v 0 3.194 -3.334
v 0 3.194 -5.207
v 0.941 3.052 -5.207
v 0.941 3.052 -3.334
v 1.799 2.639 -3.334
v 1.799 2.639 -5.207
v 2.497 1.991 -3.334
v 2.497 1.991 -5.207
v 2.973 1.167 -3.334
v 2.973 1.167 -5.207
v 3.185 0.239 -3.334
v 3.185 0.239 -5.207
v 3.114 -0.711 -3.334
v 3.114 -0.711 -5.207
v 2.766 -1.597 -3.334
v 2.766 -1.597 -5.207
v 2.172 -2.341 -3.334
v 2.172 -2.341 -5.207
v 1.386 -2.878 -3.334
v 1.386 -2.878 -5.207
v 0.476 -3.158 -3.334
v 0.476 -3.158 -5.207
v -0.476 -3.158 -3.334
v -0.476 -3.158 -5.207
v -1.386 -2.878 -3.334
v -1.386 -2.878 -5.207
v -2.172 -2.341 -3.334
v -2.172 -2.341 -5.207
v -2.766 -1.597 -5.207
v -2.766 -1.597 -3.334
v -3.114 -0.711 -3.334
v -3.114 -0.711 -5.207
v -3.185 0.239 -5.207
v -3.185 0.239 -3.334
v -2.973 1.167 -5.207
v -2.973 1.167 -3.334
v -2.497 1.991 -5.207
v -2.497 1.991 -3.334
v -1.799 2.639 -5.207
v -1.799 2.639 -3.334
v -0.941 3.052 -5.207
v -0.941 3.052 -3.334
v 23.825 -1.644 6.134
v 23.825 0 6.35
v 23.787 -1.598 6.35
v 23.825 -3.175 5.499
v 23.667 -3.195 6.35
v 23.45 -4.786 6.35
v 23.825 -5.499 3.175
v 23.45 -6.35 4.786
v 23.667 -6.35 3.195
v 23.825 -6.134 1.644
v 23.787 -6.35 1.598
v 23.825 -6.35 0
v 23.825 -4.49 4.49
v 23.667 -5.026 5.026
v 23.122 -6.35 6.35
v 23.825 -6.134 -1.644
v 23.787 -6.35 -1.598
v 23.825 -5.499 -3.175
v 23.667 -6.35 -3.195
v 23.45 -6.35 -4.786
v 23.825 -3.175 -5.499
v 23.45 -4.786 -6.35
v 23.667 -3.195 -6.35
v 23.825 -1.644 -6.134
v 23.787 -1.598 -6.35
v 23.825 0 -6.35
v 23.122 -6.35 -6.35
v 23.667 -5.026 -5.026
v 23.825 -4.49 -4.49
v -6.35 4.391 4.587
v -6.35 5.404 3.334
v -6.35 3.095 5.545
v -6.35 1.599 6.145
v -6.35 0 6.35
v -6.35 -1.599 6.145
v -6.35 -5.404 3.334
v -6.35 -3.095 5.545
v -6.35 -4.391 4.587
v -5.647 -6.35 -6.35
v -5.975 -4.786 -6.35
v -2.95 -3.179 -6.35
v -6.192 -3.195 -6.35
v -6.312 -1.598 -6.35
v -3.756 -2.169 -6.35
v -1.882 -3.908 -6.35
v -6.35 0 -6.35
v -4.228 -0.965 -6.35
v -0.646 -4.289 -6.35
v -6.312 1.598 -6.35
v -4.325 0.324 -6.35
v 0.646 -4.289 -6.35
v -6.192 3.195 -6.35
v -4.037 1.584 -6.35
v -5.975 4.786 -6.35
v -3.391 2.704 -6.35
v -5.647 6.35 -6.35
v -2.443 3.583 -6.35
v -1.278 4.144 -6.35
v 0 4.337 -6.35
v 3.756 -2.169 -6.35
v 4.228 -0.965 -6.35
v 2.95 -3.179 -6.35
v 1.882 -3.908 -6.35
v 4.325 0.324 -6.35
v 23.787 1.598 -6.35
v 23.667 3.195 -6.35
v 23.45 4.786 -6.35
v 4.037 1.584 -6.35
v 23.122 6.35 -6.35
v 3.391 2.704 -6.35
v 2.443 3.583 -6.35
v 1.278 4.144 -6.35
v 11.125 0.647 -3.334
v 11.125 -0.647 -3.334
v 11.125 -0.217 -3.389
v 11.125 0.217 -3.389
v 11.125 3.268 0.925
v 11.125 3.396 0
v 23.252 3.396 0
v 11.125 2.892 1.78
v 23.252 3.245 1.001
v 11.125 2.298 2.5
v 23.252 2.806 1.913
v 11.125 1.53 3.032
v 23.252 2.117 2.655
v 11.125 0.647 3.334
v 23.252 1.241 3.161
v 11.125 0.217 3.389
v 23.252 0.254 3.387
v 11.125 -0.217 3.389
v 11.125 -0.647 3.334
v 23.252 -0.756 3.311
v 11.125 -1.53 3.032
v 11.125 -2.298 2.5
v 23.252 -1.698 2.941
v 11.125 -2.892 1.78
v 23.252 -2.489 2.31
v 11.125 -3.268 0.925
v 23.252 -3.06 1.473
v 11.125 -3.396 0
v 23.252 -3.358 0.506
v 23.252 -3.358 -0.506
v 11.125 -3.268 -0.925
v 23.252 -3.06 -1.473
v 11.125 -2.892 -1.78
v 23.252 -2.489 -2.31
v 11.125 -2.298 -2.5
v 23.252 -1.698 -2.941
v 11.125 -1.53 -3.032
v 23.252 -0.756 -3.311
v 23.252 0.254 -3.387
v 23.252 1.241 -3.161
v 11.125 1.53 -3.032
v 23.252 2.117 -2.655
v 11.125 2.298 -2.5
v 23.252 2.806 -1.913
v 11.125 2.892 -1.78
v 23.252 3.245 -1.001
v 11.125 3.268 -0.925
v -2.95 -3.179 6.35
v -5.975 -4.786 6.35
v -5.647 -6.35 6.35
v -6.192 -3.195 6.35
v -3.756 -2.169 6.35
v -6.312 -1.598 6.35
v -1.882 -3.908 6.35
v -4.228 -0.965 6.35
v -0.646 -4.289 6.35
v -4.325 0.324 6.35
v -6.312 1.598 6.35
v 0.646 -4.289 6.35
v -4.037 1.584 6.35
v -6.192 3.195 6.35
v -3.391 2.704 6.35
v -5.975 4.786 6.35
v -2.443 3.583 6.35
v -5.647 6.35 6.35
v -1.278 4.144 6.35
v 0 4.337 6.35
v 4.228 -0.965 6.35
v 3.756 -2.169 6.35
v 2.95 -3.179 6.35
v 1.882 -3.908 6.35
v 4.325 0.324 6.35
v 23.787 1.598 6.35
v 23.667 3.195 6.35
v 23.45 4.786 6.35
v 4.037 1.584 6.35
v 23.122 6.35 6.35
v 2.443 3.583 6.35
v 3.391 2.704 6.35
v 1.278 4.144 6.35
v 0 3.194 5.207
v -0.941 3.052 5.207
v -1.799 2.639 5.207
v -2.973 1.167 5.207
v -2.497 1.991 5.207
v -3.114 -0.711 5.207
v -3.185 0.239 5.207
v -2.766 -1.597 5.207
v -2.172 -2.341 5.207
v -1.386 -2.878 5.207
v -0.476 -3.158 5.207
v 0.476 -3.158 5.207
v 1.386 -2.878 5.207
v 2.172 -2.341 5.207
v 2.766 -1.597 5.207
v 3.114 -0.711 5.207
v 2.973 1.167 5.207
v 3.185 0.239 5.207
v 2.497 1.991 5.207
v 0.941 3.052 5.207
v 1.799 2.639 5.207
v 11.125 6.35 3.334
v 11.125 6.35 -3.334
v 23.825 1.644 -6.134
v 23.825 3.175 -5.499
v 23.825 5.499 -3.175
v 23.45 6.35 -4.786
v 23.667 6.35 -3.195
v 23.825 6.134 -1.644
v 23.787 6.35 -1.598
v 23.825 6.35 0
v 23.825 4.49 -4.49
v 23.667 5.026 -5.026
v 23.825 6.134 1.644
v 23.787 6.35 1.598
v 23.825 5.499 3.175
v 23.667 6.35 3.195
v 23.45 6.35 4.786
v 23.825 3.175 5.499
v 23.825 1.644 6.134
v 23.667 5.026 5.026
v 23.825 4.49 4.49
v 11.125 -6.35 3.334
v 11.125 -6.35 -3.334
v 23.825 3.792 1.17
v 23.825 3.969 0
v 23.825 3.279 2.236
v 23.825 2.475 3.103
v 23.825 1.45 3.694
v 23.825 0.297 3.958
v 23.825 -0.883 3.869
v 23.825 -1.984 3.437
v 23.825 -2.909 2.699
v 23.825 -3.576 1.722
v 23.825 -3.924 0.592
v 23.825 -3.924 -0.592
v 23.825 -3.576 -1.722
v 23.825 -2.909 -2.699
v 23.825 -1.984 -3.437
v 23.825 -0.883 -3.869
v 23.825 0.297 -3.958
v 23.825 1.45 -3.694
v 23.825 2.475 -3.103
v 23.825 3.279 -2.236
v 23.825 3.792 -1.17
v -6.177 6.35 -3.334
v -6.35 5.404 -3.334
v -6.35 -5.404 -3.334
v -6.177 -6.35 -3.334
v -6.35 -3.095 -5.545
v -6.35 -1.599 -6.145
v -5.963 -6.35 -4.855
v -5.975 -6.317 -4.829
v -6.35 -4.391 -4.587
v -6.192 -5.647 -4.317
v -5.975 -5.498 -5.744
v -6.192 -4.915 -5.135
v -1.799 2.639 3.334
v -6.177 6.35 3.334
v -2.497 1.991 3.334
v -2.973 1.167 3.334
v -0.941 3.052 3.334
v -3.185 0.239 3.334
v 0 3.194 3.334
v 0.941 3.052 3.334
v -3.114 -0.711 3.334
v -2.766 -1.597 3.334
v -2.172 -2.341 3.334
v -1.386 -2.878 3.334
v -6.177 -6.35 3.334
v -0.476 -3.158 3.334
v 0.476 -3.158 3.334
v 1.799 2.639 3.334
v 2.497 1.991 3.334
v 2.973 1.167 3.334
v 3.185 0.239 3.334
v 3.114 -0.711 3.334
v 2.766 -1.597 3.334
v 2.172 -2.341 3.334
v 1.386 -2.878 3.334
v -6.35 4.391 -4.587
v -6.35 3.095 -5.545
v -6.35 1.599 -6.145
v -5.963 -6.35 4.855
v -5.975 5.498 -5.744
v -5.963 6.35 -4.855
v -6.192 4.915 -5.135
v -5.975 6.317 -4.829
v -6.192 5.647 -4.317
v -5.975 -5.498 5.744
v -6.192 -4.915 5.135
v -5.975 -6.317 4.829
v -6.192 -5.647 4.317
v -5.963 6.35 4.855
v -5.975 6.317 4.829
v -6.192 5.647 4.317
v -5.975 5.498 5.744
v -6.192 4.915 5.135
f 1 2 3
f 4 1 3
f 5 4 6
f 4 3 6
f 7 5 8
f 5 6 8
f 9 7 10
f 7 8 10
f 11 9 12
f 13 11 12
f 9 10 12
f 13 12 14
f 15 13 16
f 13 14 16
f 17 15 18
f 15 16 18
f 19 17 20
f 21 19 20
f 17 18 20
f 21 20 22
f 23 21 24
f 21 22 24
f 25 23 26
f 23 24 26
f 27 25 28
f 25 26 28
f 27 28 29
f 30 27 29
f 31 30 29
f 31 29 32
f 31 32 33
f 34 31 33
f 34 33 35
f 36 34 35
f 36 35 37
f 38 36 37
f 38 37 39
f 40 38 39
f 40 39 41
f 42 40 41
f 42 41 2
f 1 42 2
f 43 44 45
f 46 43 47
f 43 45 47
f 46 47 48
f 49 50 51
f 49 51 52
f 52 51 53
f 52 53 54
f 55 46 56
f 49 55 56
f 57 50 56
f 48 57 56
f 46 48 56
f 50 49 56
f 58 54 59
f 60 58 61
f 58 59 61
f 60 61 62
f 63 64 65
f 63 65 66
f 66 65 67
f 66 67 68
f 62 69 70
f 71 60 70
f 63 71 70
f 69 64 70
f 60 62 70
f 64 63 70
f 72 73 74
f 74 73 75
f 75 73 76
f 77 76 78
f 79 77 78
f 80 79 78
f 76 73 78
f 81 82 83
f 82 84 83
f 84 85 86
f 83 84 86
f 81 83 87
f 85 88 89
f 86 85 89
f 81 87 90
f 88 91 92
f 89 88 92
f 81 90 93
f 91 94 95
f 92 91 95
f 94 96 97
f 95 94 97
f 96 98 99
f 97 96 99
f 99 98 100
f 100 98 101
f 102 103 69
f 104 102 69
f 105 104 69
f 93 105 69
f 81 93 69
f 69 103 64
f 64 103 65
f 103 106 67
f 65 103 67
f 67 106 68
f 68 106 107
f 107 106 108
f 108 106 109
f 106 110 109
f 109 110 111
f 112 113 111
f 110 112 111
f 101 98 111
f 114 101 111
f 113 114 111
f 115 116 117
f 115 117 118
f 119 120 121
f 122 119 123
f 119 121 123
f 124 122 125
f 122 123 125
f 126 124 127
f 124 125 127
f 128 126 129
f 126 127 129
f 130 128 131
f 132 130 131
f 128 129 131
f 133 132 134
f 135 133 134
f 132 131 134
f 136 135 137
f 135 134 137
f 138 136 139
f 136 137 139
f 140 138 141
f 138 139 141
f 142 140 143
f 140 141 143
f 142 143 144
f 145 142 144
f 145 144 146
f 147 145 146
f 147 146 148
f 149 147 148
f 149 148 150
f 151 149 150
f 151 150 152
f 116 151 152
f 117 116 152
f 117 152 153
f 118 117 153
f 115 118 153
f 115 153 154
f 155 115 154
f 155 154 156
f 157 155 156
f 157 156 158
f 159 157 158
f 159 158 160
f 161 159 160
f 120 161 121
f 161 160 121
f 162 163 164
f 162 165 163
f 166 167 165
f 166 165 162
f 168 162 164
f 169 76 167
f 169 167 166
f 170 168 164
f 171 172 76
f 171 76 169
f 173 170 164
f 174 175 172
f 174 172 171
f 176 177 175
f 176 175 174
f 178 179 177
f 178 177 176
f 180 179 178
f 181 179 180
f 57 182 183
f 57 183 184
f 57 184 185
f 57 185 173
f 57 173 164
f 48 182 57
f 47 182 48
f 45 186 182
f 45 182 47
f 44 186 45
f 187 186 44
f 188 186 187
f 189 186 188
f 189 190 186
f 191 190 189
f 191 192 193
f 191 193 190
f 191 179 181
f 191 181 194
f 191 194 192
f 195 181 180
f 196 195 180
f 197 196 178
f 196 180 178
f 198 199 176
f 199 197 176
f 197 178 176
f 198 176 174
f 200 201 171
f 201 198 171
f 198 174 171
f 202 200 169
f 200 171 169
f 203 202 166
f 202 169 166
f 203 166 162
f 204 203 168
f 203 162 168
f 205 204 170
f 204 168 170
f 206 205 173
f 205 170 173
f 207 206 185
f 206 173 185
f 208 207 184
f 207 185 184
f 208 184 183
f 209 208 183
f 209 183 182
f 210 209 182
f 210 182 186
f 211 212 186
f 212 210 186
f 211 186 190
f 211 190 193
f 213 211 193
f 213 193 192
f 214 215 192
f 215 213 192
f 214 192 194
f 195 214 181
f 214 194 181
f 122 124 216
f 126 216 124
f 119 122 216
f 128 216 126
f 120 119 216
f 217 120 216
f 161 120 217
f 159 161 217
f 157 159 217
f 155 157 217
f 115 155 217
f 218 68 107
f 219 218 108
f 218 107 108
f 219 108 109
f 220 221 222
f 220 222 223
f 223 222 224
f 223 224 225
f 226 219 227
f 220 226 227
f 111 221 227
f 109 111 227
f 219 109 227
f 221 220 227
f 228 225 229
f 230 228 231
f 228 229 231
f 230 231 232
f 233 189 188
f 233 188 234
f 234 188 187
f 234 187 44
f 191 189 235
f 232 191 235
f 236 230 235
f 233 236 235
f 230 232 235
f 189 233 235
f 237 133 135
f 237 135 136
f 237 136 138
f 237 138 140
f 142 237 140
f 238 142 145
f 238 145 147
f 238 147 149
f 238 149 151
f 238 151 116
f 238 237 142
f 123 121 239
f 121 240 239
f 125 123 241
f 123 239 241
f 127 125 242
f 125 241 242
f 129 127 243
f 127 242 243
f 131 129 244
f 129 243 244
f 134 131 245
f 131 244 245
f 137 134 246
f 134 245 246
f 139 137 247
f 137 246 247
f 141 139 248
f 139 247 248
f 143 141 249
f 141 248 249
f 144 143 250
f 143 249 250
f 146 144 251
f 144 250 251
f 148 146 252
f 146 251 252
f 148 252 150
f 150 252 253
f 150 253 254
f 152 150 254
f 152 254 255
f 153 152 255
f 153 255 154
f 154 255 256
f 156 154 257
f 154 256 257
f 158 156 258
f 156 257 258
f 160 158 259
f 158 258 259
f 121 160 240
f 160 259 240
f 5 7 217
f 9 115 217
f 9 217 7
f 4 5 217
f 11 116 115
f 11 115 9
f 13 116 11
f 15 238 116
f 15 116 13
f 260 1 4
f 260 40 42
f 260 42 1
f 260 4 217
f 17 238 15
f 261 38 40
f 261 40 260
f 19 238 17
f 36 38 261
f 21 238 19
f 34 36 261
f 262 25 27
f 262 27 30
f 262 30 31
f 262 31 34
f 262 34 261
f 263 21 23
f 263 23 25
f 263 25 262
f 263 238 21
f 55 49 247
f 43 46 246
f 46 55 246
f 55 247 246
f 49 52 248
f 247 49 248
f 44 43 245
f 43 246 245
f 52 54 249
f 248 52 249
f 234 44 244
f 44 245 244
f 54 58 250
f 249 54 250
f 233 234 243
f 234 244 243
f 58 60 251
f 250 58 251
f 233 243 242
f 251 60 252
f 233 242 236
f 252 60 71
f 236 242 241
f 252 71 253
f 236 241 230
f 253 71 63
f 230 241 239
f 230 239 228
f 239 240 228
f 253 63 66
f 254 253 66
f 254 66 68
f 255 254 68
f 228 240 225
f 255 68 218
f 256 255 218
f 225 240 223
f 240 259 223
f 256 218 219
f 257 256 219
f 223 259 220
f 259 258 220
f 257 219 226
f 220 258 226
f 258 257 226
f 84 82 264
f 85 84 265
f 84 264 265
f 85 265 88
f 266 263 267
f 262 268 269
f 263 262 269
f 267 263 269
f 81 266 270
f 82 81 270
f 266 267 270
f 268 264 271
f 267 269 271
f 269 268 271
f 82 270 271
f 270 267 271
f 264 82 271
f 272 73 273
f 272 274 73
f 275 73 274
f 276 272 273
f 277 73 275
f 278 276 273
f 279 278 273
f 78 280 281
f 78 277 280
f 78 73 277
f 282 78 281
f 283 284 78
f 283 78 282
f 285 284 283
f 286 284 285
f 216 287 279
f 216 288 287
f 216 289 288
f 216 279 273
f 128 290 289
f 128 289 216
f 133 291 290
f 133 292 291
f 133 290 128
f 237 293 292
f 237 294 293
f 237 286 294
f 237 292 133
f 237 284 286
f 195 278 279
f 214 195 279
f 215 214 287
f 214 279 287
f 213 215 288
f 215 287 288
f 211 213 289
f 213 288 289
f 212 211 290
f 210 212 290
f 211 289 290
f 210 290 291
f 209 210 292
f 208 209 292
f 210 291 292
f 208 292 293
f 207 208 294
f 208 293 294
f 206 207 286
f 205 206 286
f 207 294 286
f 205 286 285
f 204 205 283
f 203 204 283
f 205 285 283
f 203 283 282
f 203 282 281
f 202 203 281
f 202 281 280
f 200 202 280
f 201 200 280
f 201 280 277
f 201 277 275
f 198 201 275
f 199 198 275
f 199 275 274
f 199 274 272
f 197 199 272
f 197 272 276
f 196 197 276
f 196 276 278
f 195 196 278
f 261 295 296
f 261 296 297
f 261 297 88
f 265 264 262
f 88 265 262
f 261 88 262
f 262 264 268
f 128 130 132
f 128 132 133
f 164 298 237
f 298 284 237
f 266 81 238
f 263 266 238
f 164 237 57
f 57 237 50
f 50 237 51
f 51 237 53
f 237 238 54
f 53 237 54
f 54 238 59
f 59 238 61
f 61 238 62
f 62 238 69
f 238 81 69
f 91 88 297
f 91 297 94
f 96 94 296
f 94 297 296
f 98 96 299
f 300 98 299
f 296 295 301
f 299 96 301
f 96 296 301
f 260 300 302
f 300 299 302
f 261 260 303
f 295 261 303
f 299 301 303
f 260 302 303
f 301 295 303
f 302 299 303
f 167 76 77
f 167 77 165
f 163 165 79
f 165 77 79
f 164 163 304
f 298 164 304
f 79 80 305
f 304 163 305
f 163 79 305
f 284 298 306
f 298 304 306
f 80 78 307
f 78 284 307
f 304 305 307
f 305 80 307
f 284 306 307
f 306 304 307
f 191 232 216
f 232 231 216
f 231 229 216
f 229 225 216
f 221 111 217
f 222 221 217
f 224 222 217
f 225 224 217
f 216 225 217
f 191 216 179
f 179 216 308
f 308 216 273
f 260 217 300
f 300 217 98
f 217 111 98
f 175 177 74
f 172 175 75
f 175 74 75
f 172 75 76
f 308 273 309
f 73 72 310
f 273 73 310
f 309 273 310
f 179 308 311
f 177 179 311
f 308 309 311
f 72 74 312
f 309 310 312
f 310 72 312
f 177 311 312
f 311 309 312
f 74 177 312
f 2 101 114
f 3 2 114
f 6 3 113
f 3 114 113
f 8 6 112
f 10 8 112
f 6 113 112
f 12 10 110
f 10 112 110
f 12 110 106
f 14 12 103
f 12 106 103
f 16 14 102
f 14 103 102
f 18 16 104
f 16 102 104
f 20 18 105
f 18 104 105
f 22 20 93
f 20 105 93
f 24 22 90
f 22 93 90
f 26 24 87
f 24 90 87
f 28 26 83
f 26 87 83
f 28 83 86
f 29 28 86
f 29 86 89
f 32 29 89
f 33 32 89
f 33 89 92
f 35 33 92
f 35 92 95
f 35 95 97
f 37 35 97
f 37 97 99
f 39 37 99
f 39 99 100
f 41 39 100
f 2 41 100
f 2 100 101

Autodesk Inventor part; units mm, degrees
sketch "Sketch_1" plane through (0, 0, 0) normal (0, 0, 1) x (1, 0, 0)
  line L0 (-6.35, 6.35) -> (-6.35, -6.35)
  line L1 (-6.35, -6.35) -> (23.8252, -6.35)
  line L2 (23.8252, -6.35) -> (23.8252, 6.35)
  line L3 (23.8252, 6.35) -> (-6.35, 6.35)
extrude "Extrusion1" add sketch "Sketch_1" along normal mid plane 12.7
sketch "Sketch_2" plane through (0, 0, 0) normal (0, 1, 0) x (-1, 0, 0)
  line L0 (6.35, -3.3338) -> (6.35, 3.3338)
  line L1 (6.35, 3.3338) -> (-11.1252, 3.3338)
  line L2 (-11.1252, 3.3338) -> (-11.1252, -3.3338)
  line L3 (-11.1252, -3.3338) -> (6.35, -3.3338)
extrude "Extrusion2" cut sketch "Sketch_2" along normal mid plane 12.7
sketch "Sketch_3" plane through (0, 0, 0) normal (0, 0, 1) x (1, 0, 0)
  line L0 (23.8252, 0) -> (12.6492, 0)
  line L1 (12.6492, 0) -> (12.6492, 3.396)
  line L2 (12.6492, 3.396) -> (23.2524, 3.396)
  line L3 (23.2524, 3.396) -> (23.8252, 3.9688)
  line L4 (23.8252, 3.9688) -> (23.8252, 0)
  line L5 (23.8252, 0) -> (12.6492, 0)
revolve "Revolution1" cut sketch "Sketch_3" angle 360 about axis through (23.8252, 0, 0) along (1, 0, 0)
thread "Thread1" size "5/16-20 UN" class "3B" standard "ANSI Unified Screw Threads" full length
sketch "Sketch_4" plane through (0, 0, 0) normal (0, 0, 1) x (1, 0, 0)
  line L0 (12.6492, 0) -> (11.1252, 0)
  line L1 (11.1252, 0) -> (11.1252, 3.396)
  line L2 (11.1252, 3.396) -> (12.6492, 3.396)
  line L3 (12.6492, 3.396) -> (12.6492, 0)
  line L4 (12.6492, 0) -> (11.1252, 0)
revolve "Revolution2" cut sketch "Sketch_4" angle 360 about axis through (12.6492, 0, 0) along (1, 0, 0)
sketch "Sketch_5" plane through (0, 0, 0) normal (1, 0, 0) x (0, 1, 0)
  line L0 (0, -6.35) -> (0, 6.35)
  line L1 (0, 6.35) -> (4.337, 6.35)
  line L2 (4.337, 6.35) -> (3.194, 5.207)
  line L3 (3.194, 5.207) -> (3.194, -5.207)
  line L4 (3.194, -5.207) -> (4.337, -6.35)
  line L5 (4.337, -6.35) -> (0, -6.35)
  line L6 (0, -6.35) -> (0, 6.35)
revolve "Revolution3" cut sketch "Sketch_5" angle 360 about axis through (0, 0, -6.35) along (0, 0, -1)
sketch "Sketch_9" plane through (0, 0, 0) normal (0, 0, 1) x (1, 0, 0)
  line L0 (30.1752, 0) -> (23.8252, 0)
  line L1 (23.8252, 0) -> (23.8252, 6.35)
  arc A0 (23.8252, 6.35) -> (21.2852, 12.7) centre (6.6802, 3.175) ccw
  line L2 (21.2852, 12.7) -> (30.1752, 12.7)
  line L3 (30.1752, 12.7) -> (30.1752, 0)
  line L4 (30.1752, 0) -> (23.8252, 0)
revolve "Revolution4" cut sketch "Sketch_9" angle 360 about axis through (30.1752, 0, 0) along (1, 0, 0)
sketch "Sketch_10" plane through (0, 0, 0) normal (0, 0, 1) x (1, 0, 0)
  line L0 (-6.35, 0) -> (-12.7, 0)
  line L1 (-12.7, 0) -> (-12.7, 12.7)
  line L2 (-12.7, 12.7) -> (-3.81, 12.7)
  arc A0 (-3.81, 12.7) -> (-6.35, 6.35) centre (10.795, 3.175) ccw
  line L3 (-6.35, 6.35) -> (-6.35, 0)
  line L4 (-6.35, 0) -> (-12.7, 0)
revolve "Revolution5" cut sketch "Sketch_10" angle 360 about axis through (-6.35, 0, 0) along (1, 0, 0)
ref_plane "th1_XY" through (23.8252, 3.9688, 0) normal (0, 0, 1) x (1, 0, 0)
ref_plane "th1_YZ" through (23.8252, 3.9688, 0) normal (1, 0, 0) x (0, 1, 0)
ref_plane "th1_ZX" through (23.8252, 3.9688, 0) normal (0, 1, 0) x (0, 0, 1)
ref_plane "th2_XY" through (23.8252, -3.9688, 0) normal (0, 0, 1) x (1, 0, 0)
ref_plane "th2_YZ" through (23.8252, -3.9688, 0) normal (1, 0, 0) x (0, 1, 0)
ref_plane "th2_ZX" through (23.8252, -3.9688, 0) normal (0, 1, 0) x (0, 0, 1)
ref_plane "rod_clevis_body_XY" through (0, 0, 0) normal (0, 0, 1) x (1, 0, 0)
ref_plane "rod_clevis_body_YZ" through (0, 0, 0) normal (1, 0, 0) x (0, 1, 0)
ref_plane "rod_clevis_body_ZX" through (0, 0, 0) normal (0, 1, 0) x (0, 0, 1)
ref_plane "piston_rod_clevis_XY" through (23.8252, 0, 0) normal (1, 0, 0) x (0, 0, -1)
ref_plane "piston_rod_clevis_YZ" through (23.8252, 0, 0) normal (0, 0, -1) x (0, 1, 0)
ref_plane "piston_rod_clevis_ZX" through (23.8252, 0, 0) normal (0, 1, 0) x (1, 0, 0)
ref_plane "dummy_XY" through (0, 0, 0) normal (0, 0, 1) x (1, 0, 0)
ref_plane "dummy_YZ" through (0, 0, 0) normal (1, 0, 0) x (0, 1, 0)
ref_plane "dummy_ZX" through (0, 0, 0) normal (0, 1, 0) x (0, 0, 1)
ref_plane "l11_XY" through (23.8252, 6.35, 0) normal (0, 0, 1) x (1, 0, 0)
ref_plane "l11_YZ" through (23.8252, 6.35, 0) normal (1, 0, 0) x (0, 1, 0)
ref_plane "l11_ZX" through (23.8252, 6.35, 0) normal (0, 1, 0) x (0, 0, 1)
ref_plane "l12_XY" through (0, 6.35, 0) normal (0, 0, 1) x (1, 0, 0)
ref_plane "l12_YZ" through (0, 6.35, 0) normal (1, 0, 0) x (0, 1, 0)
ref_plane "l12_ZX" through (0, 6.35, 0) normal (0, 1, 0) x (0, 0, 1)
ref_plane "l1_XY" through (23.8252, 6.35, 0) normal (0, 0, 1) x (1, 0, 0)
ref_plane "l1_YZ" through (23.8252, 6.35, 0) normal (1, 0, 0) x (0, 1, 0)
ref_plane "l1_ZX" through (23.8252, 6.35, 0) normal (0, 1, 0) x (0, 0, 1)
ref_plane "h1_XY" through (-6.35, 6.35, 0) normal (0, 0, 1) x (1, 0, 0)
ref_plane "h1_YZ" through (-6.35, 6.35, 0) normal (1, 0, 0) x (0, 1, 0)
ref_plane "h1_ZX" through (-6.35, 6.35, 0) normal (0, 1, 0) x (0, 0, 1)
ref_plane "l2_XY" through (-6.35, 6.35, 0) normal (0, 0, 1) x (1, 0, 0)
ref_plane "l2_YZ" through (-6.35, 6.35, 0) normal (1, 0, 0) x (0, 1, 0)
ref_plane "l2_ZX" through (-6.35, 6.35, 0) normal (0, 1, 0) x (0, 0, 1)
ref_plane "h2_XY" through (-6.35, -6.35, 0) normal (0, 0, 1) x (1, 0, 0)
ref_plane "h2_YZ" through (-6.35, -6.35, 0) normal (1, 0, 0) x (0, 1, 0)
ref_plane "h2_ZX" through (-6.35, -6.35, 0) normal (0, 1, 0) x (0, 0, 1)
ref_plane "w11_XY" through (-6.35, 0, -3.3338) normal (0, 1, 0) x (1, 0, 0)
ref_plane "w11_YZ" through (-6.35, 0, -3.3338) normal (1, 0, 0) x (0, 0, -1)
ref_plane "w11_ZX" through (-6.35, 0, -3.3338) normal (0, 0, -1) x (0, 1, 0)
ref_plane "w12_XY" through (-6.35, 0, 3.3338) normal (0, 1, 0) x (1, 0, 0)
ref_plane "w12_YZ" through (-6.35, 0, 3.3338) normal (1, 0, 0) x (0, 0, -1)
ref_plane "w12_ZX" through (-6.35, 0, 3.3338) normal (0, 0, -1) x (0, 1, 0)
ref_plane "l21_XY" through (23.8252, 0, 0) normal (0, 1, 0) x (1, 0, 0)
ref_plane "l21_YZ" through (23.8252, 0, 0) normal (1, 0, 0) x (0, 0, -1)
ref_plane "l21_ZX" through (23.8252, 0, 0) normal (0, 0, -1) x (0, 1, 0)
ref_plane "l22_XY" through (11.1252, 0, 0) normal (0, 1, 0) x (1, 0, 0)
ref_plane "l22_YZ" through (11.1252, 0, 0) normal (1, 0, 0) x (0, 0, -1)
ref_plane "l22_ZX" through (11.1252, 0, 0) normal (0, 0, -1) x (0, 1, 0)
ref_plane "w1_XY" through (23.8252, 0, -6.35) normal (0, 1, 0) x (1, 0, 0)
ref_plane "w1_YZ" through (23.8252, 0, -6.35) normal (1, 0, 0) x (0, 0, -1)
ref_plane "w1_ZX" through (23.8252, 0, -6.35) normal (0, 0, -1) x (0, 1, 0)
ref_plane "w2_XY" through (23.8252, 0, 6.35) normal (0, 1, 0) x (1, 0, 0)
ref_plane "w2_YZ" through (23.8252, 0, 6.35) normal (1, 0, 0) x (0, 0, -1)
ref_plane "w2_ZX" through (23.8252, 0, 6.35) normal (0, 0, -1) x (0, 1, 0)
ref_plane "to_cylinder_XY" through (11.1252, 0, 0) normal (1, 0, 0) x (0, 0, -1)
ref_plane "to_cylinder_YZ" through (11.1252, 0, 0) normal (0, 0, -1) x (0, 1, 0)
ref_plane "to_cylinder_ZX" through (11.1252, 0, 0) normal (0, 1, 0) x (1, 0, 0)
properties part number "D-14059"
